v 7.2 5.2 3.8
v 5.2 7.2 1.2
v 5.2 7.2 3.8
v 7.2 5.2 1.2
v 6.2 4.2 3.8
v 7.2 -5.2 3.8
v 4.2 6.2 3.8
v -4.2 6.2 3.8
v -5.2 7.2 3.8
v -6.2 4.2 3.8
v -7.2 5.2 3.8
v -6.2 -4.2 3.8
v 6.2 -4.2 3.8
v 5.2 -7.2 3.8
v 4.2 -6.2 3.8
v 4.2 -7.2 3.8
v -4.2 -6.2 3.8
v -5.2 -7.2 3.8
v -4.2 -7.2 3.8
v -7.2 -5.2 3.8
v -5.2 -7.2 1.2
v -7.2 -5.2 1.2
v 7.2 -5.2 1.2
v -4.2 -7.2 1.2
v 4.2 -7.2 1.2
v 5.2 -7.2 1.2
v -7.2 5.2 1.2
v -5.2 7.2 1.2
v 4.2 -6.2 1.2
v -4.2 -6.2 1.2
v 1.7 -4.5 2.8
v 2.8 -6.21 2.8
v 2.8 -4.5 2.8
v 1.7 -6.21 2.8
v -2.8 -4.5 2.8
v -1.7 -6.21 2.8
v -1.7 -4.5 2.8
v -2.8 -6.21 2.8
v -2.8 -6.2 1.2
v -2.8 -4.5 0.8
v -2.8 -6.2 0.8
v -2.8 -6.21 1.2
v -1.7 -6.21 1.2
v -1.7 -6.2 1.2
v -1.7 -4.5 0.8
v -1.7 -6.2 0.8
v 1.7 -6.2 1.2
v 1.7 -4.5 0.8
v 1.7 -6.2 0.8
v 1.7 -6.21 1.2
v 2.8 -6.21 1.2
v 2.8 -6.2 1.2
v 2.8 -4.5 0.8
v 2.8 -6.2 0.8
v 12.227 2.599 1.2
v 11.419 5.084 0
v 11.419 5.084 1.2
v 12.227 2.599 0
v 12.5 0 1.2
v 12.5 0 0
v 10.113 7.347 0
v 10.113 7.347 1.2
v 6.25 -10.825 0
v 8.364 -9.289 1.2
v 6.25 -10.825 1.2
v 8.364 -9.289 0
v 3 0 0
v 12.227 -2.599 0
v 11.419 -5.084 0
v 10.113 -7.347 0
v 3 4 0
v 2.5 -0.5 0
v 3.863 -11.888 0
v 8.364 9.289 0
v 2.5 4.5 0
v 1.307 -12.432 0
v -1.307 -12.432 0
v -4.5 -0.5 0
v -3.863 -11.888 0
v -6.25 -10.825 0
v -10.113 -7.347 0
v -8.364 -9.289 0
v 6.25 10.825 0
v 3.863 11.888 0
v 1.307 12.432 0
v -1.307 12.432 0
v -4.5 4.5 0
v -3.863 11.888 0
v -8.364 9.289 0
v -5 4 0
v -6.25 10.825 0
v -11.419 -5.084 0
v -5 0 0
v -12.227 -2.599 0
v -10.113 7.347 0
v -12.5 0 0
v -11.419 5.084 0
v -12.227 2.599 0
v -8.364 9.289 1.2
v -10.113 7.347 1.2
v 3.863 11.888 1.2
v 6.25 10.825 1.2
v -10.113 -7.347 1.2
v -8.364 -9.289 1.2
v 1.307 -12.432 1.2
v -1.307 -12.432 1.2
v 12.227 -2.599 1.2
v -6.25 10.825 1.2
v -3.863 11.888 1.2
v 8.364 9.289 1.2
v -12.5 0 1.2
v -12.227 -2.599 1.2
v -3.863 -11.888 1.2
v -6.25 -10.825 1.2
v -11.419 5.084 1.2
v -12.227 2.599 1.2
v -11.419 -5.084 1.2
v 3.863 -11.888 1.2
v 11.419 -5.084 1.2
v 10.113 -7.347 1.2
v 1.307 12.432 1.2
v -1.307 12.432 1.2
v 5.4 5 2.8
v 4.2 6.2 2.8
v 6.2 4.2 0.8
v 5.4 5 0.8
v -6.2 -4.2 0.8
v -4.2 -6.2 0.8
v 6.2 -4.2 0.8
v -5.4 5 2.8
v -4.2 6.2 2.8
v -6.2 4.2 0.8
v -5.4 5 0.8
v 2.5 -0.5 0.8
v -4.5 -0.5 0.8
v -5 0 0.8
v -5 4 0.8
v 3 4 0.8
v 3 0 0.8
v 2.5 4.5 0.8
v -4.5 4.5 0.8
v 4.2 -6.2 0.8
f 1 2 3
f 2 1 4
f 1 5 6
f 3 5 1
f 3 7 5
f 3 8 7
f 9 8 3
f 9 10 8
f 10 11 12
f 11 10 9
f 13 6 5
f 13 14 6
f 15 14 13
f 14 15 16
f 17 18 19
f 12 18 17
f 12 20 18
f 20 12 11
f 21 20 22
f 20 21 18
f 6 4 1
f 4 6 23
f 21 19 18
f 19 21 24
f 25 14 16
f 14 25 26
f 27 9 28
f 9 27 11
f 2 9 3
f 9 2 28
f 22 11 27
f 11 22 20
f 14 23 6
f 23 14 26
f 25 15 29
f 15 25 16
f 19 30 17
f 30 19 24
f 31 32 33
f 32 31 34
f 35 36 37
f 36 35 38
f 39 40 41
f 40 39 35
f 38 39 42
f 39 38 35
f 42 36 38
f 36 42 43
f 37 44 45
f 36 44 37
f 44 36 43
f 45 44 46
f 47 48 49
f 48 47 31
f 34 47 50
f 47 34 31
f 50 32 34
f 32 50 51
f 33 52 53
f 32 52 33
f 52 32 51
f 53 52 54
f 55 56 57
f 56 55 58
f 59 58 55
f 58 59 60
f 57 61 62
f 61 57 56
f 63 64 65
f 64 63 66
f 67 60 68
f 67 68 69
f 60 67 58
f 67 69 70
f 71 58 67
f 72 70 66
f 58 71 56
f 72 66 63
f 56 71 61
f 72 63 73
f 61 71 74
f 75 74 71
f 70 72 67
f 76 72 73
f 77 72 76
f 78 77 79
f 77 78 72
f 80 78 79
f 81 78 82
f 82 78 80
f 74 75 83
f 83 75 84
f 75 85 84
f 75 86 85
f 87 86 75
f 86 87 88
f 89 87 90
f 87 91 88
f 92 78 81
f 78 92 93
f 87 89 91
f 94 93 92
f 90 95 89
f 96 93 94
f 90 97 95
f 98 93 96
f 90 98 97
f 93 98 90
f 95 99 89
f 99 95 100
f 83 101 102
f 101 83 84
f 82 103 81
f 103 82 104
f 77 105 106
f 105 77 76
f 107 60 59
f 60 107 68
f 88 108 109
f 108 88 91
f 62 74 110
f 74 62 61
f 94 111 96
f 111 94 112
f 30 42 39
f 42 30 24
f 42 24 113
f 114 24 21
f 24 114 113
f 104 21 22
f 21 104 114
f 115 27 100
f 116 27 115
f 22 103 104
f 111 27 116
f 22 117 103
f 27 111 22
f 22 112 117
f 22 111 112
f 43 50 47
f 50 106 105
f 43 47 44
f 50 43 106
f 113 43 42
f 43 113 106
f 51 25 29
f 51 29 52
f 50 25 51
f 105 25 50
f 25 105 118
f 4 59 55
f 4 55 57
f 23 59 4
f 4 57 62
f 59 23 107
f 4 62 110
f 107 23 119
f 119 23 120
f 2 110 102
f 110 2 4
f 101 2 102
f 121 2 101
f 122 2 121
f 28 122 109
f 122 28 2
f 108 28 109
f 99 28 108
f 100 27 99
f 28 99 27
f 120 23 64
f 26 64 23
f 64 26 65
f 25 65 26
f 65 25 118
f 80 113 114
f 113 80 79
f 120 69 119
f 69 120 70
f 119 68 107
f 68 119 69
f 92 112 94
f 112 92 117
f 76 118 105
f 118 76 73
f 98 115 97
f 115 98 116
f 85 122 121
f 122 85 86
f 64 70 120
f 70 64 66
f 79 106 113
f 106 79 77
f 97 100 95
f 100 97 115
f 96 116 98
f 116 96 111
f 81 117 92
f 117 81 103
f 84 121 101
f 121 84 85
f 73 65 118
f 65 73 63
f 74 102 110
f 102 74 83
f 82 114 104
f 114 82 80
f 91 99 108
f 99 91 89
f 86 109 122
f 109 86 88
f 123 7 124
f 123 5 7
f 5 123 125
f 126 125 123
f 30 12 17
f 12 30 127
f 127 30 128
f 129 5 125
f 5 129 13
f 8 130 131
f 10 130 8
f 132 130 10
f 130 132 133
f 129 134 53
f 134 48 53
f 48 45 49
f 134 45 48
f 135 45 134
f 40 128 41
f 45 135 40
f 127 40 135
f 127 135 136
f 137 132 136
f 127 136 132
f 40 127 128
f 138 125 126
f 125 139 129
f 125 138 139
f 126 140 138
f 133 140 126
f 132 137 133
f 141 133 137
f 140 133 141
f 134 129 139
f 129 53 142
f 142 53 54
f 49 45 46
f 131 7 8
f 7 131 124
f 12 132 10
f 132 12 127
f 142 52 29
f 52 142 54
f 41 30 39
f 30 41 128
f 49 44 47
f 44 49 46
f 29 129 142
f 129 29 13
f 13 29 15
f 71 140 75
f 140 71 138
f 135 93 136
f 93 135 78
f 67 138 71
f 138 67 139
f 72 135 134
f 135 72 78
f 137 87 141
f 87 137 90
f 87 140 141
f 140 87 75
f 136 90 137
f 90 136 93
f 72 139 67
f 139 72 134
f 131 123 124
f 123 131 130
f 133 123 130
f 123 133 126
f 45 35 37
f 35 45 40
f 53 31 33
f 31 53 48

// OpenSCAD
function snub(xmin, ymin, xmax, ymax, d) = [ [xmax, ymax-d], [xmax, ymin+d], [xmax-d, ymin], [xmin+d, ymin], [xmin, ymin+d], [xmin, ymax-d], [xmin+d, ymax], [xmax-d, ymax] ];

BOTTOM_THICKNESS = .8;
D = .01;

//DRIVER_PCB_SHAPE = [ [6,4], [4,6], [-4,6], [-6,4], [-6, -4], [-4, -6], [4, -6], [6, -4] ];
DRIVER_KEEPOUT_SHAPE = snub(-6.2, -6.2, 6.2, 6.2, 2);
DRIVER_WALL_SHAPE = snub(-7.2, -7.2, 7.2, 7.2, 2);


DRIVER_PCB_SHAPE = snub(-6, -6, 6, 6, 2);
DRIVER_CLAMP_SHAPE = [ [-5.4-D, 5], [5.4+D, 5], [4.2+D, 6.2+D], [-4.2-D, 6.2+D] ];
DRIVER_ISP_KEEPOUT = snub(-5, -.5, 3, 4.5, .5);//		-3, -4.5, 5, .5, .5);
DRIVER_STANDOFF_1 = [ [-1.7, -6.2-D], [-1.7, -4.5], [-2.8, -4.5], [-2.8, -6.2-D] ] ;
DRIVER_STANDOFF_2 = [ [ 1.7, -6.2-D], [ 1.7, -4.5], [ 2.8, -4.5], [ 2.8, -6.2-D] ] ;


module driver_cutout()
{
	difference()
	{
		union()
		{	
			translate([0,0,BOTTOM_THICKNESS])
				linear_extrude(5)
					polygon(DRIVER_KEEPOUT_SHAPE);
			translate([0,0,-D])
				linear_extrude(5)
					polygon(DRIVER_ISP_KEEPOUT);
			driver_isp_hole();
		}
		driver_standoffs();
	}
}

module driver_standoffs()
{
	translate([0,0,BOTTOM_THICKNESS-D])
		linear_extrude(2+D)
		{
				polygon(DRIVER_CLAMP_SHAPE);
				polygon(DRIVER_STANDOFF_1);
				polygon(DRIVER_STANDOFF_2);
		}
}

module driver_wall(w)
{
	difference ()
	{
		translate([0,0,BOTTOM_THICKNESS-D])
			linear_extrude(3+D)
				polygon(snub(-6.2-w, -6.2-w, 6.2+w, 6.2+w, 2));
		translate([0,0,BOTTOM_THICKNESS-D-D])
			linear_extrude(3+D+D+D)
				polygon([ [-4.2, -5], [4.2, -5], [4.2, -8], [-4.2, -8] ]);
	}
}

module driver_isp_hole()
{
	translate([0,0,-100])
		linear_extrude(105)
			polygon(DRIVER_ISP_KEEPOUT);
}


module driver_positive(w)
{
	driver_wall(w);
	driver_standoffs();
}

difference()
{
	union()
	{
		cylinder(r=12.5, h=1.2);
		driver_positive(1);
	}
	driver_cutout();
}
